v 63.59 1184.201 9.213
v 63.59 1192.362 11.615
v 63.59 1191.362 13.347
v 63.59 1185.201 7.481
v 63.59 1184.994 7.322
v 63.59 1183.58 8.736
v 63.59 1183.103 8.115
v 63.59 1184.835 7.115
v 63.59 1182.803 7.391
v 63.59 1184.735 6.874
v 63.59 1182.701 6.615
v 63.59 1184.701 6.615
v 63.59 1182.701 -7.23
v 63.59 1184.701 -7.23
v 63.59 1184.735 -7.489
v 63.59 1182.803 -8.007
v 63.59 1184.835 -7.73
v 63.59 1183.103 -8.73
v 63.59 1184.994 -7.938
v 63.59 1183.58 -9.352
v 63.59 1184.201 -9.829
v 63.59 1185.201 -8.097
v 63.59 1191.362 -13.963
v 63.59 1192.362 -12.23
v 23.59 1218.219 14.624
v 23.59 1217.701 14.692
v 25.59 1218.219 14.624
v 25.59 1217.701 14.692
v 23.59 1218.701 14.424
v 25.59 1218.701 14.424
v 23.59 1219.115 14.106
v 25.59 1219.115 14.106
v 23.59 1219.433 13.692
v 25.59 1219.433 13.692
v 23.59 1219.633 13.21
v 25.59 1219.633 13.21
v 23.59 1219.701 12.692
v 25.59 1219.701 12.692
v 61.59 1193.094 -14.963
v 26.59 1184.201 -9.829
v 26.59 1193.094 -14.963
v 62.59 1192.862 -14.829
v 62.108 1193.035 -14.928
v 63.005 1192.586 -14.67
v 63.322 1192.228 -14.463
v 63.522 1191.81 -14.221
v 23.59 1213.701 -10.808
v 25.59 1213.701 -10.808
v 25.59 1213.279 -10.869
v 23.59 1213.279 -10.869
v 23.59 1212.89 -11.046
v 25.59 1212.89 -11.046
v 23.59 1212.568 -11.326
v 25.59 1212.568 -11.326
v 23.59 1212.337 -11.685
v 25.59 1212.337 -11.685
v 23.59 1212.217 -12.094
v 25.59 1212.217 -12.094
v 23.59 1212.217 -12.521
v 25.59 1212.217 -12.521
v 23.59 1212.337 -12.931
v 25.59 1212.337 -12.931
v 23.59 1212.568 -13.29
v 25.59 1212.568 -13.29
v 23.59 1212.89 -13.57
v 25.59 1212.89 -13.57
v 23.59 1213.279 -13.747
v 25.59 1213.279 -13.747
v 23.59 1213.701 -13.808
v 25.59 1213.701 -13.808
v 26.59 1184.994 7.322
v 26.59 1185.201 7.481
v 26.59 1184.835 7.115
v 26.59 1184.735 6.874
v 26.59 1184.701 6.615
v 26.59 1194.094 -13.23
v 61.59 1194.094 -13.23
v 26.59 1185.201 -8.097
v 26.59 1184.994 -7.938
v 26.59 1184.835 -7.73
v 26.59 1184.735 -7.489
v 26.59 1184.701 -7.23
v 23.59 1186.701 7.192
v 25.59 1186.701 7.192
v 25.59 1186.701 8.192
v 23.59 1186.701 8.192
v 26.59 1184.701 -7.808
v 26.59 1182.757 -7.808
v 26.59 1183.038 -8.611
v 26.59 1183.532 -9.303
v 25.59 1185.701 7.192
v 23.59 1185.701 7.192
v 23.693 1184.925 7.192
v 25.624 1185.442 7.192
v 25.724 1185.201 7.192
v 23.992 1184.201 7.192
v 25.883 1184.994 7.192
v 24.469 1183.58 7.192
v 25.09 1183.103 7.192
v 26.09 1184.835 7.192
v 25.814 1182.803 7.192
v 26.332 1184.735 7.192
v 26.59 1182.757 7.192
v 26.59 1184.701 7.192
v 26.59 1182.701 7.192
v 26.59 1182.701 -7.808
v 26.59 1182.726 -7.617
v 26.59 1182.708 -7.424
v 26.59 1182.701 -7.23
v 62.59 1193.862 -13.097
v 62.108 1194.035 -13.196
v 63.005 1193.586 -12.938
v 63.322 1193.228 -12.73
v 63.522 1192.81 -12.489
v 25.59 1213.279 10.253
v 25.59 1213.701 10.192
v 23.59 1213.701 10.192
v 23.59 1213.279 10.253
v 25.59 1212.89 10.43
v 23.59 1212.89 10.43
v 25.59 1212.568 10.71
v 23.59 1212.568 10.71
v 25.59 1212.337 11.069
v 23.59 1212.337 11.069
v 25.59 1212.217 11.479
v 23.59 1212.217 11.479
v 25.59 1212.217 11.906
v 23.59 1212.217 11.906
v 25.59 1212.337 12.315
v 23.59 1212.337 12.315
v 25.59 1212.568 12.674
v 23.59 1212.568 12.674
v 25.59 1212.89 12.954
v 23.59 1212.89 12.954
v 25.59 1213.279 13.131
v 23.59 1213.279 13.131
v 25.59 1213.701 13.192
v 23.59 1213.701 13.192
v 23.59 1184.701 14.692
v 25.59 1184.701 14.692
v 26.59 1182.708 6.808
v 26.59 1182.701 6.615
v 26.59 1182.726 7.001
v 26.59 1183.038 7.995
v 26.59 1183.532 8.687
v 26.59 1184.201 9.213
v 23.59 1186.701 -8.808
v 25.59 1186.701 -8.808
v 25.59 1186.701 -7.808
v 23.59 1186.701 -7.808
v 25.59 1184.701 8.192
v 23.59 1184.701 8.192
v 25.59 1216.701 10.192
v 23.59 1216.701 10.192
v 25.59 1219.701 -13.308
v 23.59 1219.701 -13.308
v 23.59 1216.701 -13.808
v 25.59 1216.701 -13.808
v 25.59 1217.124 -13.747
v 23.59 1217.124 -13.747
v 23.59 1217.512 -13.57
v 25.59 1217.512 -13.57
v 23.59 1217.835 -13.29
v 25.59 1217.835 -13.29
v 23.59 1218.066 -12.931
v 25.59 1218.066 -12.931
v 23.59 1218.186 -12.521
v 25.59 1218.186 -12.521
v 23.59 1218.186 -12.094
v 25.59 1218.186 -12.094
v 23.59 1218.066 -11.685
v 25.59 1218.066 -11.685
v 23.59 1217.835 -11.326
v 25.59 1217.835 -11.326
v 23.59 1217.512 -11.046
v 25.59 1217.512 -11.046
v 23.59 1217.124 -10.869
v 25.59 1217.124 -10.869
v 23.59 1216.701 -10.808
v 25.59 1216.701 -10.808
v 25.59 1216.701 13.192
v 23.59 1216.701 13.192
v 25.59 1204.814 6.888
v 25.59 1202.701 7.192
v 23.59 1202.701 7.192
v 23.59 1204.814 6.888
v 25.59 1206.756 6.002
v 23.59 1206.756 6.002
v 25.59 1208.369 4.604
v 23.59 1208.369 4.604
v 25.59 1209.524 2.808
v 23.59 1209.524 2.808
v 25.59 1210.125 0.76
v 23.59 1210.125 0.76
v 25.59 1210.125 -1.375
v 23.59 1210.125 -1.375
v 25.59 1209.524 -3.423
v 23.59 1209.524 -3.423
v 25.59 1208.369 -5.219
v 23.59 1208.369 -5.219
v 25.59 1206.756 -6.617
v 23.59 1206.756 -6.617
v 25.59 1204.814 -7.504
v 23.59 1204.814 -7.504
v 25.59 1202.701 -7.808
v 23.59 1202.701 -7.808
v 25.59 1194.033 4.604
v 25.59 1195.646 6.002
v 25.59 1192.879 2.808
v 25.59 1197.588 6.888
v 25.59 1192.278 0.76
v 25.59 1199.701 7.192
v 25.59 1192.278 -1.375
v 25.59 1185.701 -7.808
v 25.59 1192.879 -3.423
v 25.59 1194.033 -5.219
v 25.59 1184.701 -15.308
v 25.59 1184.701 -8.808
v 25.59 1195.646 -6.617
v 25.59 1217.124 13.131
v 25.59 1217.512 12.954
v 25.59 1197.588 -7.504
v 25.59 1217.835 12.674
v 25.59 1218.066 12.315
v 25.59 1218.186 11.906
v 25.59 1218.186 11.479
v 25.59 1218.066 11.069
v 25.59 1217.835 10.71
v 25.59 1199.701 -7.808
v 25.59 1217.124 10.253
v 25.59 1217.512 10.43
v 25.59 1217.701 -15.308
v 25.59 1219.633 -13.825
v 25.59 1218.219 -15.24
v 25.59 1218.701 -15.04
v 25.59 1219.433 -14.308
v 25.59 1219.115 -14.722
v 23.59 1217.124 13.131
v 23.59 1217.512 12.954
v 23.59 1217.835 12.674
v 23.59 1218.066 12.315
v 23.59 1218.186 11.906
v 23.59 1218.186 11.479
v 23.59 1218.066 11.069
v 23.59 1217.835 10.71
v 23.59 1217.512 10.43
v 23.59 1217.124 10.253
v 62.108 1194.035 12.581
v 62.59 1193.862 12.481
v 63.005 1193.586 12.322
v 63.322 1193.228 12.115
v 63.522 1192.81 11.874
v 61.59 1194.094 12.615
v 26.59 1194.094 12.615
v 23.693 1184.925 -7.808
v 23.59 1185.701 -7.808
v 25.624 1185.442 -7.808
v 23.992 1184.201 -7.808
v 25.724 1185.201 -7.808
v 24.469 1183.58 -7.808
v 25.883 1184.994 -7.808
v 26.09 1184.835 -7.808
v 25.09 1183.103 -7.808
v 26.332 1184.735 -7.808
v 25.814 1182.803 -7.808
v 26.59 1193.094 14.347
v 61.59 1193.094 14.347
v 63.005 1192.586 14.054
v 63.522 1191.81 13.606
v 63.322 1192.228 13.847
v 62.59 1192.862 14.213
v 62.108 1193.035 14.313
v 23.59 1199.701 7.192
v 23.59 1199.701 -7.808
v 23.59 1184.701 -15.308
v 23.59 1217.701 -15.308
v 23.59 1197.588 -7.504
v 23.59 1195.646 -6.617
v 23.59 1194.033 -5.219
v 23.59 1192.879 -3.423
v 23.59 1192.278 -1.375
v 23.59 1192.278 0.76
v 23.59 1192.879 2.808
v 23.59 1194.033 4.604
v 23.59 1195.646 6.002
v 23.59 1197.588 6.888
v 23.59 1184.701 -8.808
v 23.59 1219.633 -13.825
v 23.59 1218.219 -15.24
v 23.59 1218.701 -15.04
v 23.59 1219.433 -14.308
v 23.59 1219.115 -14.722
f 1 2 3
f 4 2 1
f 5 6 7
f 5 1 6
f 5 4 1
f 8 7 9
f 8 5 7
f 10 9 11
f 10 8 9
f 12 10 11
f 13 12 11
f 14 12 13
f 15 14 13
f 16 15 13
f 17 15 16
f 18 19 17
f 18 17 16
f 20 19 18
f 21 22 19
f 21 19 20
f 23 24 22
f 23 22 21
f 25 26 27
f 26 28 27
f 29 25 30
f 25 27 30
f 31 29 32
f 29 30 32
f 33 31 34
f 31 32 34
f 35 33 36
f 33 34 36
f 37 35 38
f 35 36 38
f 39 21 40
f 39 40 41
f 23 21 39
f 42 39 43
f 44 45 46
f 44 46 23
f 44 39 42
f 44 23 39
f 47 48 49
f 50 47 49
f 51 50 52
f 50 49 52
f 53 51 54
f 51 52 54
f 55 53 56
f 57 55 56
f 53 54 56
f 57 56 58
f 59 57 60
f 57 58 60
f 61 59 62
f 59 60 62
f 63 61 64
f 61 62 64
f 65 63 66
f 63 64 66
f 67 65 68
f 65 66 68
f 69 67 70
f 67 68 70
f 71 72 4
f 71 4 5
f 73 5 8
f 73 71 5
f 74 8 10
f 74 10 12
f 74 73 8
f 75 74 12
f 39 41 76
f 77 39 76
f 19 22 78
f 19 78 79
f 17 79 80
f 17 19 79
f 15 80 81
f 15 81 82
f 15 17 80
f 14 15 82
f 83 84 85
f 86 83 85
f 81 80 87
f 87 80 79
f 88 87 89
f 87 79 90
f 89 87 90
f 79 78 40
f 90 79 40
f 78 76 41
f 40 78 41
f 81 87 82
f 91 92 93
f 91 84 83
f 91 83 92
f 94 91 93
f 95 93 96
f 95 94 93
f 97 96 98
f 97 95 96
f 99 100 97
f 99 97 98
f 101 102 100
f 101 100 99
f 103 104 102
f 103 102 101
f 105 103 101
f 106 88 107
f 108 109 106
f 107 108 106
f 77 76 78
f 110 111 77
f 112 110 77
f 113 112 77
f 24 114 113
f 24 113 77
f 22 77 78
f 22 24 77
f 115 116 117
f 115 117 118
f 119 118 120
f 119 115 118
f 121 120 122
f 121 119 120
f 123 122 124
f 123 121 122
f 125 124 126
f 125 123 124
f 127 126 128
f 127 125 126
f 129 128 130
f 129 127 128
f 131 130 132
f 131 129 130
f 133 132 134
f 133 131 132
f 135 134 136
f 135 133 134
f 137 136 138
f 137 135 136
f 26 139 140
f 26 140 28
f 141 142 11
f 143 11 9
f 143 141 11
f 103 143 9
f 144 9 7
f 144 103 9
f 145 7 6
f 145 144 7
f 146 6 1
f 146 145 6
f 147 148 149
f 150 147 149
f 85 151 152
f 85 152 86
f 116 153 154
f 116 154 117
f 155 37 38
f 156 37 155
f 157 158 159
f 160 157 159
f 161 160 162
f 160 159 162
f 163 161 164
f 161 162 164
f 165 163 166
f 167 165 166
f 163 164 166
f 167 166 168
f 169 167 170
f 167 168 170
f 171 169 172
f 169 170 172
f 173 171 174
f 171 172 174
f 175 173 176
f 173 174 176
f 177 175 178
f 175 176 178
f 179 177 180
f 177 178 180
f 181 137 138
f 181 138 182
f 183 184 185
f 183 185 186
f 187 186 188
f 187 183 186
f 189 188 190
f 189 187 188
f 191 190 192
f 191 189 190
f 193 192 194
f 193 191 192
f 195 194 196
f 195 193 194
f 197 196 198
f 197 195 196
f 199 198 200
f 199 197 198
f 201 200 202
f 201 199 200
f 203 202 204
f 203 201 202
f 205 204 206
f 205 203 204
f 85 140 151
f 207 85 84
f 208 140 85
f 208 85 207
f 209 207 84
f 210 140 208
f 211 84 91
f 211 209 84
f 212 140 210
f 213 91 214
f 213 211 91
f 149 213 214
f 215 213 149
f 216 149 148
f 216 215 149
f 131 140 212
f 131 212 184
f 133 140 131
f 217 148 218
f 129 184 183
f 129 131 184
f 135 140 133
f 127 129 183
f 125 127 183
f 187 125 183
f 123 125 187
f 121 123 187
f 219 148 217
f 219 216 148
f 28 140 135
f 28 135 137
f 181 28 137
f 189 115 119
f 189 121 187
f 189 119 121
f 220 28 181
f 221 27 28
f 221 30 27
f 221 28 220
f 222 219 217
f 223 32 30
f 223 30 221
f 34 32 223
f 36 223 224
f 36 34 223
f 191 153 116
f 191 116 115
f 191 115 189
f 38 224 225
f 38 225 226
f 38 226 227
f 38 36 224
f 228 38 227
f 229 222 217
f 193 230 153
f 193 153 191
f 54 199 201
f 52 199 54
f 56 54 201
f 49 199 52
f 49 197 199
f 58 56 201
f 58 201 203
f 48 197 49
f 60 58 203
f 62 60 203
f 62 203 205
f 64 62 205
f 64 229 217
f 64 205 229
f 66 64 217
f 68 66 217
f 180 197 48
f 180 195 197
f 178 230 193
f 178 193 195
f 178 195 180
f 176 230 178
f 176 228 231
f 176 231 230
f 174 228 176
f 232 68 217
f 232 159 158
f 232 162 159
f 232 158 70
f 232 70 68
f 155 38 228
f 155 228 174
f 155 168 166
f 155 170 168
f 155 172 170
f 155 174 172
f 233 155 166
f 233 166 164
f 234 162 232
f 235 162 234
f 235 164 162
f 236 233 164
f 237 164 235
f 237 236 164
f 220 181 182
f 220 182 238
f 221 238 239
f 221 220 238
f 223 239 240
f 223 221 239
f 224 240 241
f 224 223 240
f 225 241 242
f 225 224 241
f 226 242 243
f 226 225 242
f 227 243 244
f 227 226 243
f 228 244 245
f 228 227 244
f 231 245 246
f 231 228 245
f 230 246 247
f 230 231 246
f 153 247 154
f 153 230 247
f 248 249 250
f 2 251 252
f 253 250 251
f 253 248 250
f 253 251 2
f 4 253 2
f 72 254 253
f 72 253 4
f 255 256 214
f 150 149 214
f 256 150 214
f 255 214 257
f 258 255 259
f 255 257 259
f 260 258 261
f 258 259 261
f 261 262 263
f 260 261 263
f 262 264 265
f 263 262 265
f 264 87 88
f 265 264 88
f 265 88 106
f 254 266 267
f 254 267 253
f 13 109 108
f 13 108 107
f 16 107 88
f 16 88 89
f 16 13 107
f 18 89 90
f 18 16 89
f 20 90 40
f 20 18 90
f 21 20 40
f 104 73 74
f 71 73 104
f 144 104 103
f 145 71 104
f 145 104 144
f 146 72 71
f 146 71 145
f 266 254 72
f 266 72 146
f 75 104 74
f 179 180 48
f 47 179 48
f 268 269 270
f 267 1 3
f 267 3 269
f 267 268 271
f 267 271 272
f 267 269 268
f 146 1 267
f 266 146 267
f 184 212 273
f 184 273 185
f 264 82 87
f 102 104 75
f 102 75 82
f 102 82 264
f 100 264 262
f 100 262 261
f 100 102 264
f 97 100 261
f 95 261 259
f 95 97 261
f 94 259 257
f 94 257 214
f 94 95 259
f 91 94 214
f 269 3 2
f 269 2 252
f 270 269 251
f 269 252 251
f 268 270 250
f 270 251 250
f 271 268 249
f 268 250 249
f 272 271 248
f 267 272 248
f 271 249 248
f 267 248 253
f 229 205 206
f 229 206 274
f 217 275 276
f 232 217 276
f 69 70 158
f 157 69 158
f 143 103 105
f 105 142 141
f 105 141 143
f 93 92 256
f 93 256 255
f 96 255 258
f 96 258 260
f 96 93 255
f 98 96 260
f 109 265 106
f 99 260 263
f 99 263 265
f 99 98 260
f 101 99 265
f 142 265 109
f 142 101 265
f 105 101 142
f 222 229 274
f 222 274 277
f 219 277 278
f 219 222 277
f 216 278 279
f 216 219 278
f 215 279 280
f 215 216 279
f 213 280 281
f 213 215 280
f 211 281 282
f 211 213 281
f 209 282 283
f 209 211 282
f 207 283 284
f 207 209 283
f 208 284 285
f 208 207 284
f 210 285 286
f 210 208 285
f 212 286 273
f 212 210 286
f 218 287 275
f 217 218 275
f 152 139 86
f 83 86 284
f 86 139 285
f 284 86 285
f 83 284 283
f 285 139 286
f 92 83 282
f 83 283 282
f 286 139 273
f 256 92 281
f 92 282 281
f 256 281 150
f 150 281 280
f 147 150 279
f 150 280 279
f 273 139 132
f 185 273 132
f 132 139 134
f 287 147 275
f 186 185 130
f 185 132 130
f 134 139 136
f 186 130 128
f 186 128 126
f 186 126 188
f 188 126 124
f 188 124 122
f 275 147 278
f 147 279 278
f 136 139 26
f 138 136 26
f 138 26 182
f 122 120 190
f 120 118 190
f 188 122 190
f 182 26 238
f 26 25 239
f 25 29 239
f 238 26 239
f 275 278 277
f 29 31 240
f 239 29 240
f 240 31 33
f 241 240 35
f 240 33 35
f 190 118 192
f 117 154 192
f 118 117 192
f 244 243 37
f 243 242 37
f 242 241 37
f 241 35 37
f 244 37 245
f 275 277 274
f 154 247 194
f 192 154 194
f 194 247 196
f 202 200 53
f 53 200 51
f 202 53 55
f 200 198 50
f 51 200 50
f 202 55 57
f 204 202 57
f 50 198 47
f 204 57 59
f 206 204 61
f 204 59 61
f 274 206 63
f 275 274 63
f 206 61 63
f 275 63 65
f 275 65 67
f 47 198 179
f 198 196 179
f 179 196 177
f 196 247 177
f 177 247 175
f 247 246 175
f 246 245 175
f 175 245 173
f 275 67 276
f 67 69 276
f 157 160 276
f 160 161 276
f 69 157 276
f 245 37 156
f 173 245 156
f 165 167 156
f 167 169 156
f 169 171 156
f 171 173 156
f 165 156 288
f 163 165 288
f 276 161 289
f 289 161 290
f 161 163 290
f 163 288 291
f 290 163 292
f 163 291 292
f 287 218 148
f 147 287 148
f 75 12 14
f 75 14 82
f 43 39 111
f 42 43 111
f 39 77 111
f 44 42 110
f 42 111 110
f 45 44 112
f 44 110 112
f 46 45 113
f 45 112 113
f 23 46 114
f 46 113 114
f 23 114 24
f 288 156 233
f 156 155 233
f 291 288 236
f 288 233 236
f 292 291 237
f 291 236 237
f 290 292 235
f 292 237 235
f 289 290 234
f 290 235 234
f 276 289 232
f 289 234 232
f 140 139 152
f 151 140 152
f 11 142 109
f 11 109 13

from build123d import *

# Parameters (mm, degrees)
SKETCH1_W                      = 30
SKETCH1_H                      = 35
BASE_FLANGE1_DEPTH             = 2
EDGE_FLANGE1_STRIP_W           = 10
EDGE_FLANGE1_STRIP_H           = 2
EDGE_FLANGE1_STRIP_CUT_DEPTH   = 15
EDGE_FLANGE1_RELIEF_W          = 11
EDGE_FLANGE1_RELIEF_H          = 1
EDGE_FLANGE1_RELIEF_CUT_DEPTH  = 2
EDGE_FLANGE1_DEPTH             = 15
CUT_EXTRUDE1_REACH             = 1222.389
CUT_EXTRUDE2_REACH             = 1222.389
EDGE_FLANGE3_STRIP_CUT_DEPTH   = 37
EDGE_FLANGE3_STRIP_CUT_2_DEPTH = 37
EDGE_FLANGE3_DEPTH             = 37
EDGE_FLANGE3_BEND_DEPTH        = 37
FILLET5_R                      = 2


# Sheet-metal steps are written as plain solids
with BuildPart() as part:
    # Sketch1 → Base-Flange1 (new body)
    with BuildSketch(Plane(origin=(23.590386714, 0, 0), x_dir=(0, 0, -1), z_dir=(1, 0, 0))):
        with Locations((0.307827961, 1202.201275355)):
            Rectangle(SKETCH1_W, SKETCH1_H)
    extrude(amount=BASE_FLANGE1_DEPTH)

    # Edge-Flange1 strip (across the edge) → Edge-Flange1 strip cut (cut)
    with BuildSketch(Plane(origin=(25.590386714, 1184.701275355, 7.192172039), x_dir=(0, 1, 0), z_dir=(0, 0, -1))):
        with Locations((-4, -1)):
            Rectangle(EDGE_FLANGE1_STRIP_W, EDGE_FLANGE1_STRIP_H)
    extrude(amount=EDGE_FLANGE1_STRIP_CUT_DEPTH, mode=Mode.SUBTRACT)

    # Edge-Flange1 relief (on the sheet) → Edge-Flange1 relief cut (cut)
    with BuildSketch(Plane(origin=(25.590386714, 1185.701275355, 7.192172039), x_dir=(0, 1, 0), z_dir=(1, 0, 0))):
        with Locations((-4.5, 0.5)):
            Rectangle(EDGE_FLANGE1_RELIEF_W, EDGE_FLANGE1_RELIEF_H)
        with Locations((-4.5, -15.5)):
            Rectangle(EDGE_FLANGE1_RELIEF_W, EDGE_FLANGE1_RELIEF_H)
    extrude(amount=-EDGE_FLANGE1_RELIEF_CUT_DEPTH, mode=Mode.SUBTRACT)

    # Edge-Flange1 section (across the edge) → Edge-Flange1 (add)
    with BuildSketch(Plane(origin=(25.590386714, 1184.701275355, 7.192172039), x_dir=(0, 1, 0), z_dir=(0, 0, -1))):
        with BuildLine():
            Line((-2, 1), (-2, 38))
            Line((-2, 38), (0, 38))
            Line((0, 38), (0, 1))
            ThreePointArc((0, 1), (0.292893219, 0.292893219), (1, 0))
            Line((1, 0), (1, -2))
            ThreePointArc((1, -2), (-1.121320344, -1.121320344), (-2, 1))
        make_face()
    extrude(amount=EDGE_FLANGE1_DEPTH)

    # Sketch7 → Cut-Extrude1 (cut, up to next)
    with BuildSketch(Plane(origin=(25.590386714, 0, 0), x_dir=(0, 0, -1), z_dir=(1, 0, 0)), mode=Mode.PRIVATE) as cut_extrude1_sk1:
        with BuildLine():
            Line((-10.192172039, 1216.701275355), (-10.192172039, 1213.701275355))
            ThreePointArc((-10.192172039, 1213.701275355), (-11.692172039, 1212.201275355), (-13.192172039, 1213.701275355))
            Line((-13.192172039, 1213.701275355), (-13.192172039, 1216.701275355))
            ThreePointArc((-13.192172039, 1216.701275355), (-11.692172039, 1218.201275355), (-10.192172039, 1216.701275355))
        make_face()
    cut_extrude1_tool1 = extrude(cut_extrude1_sk1.sketch, amount=-CUT_EXTRUDE1_REACH, mode=Mode.PRIVATE) & part.part
    # Sketch7 → Cut-Extrude1 (cut, up to next)
    with BuildSketch(Plane(origin=(25.590386714, 0, 0), x_dir=(0, 0, -1), z_dir=(1, 0, 0)), mode=Mode.PRIVATE) as cut_extrude1_sk2:
        with BuildLine():
            Line((10.807827961, 1216.701275355), (10.807827961, 1213.701275355))
            ThreePointArc((10.807827961, 1213.701275355), (12.307827961, 1212.201275355), (13.807827961, 1213.701275355))
            Line((13.807827961, 1213.701275355), (13.807827961, 1216.701275355))
            ThreePointArc((13.807827961, 1216.701275355), (12.307827961, 1218.201275355), (10.807827961, 1216.701275355))
        make_face()
    cut_extrude1_tool2 = extrude(cut_extrude1_sk2.sketch, amount=-CUT_EXTRUDE1_REACH, mode=Mode.PRIVATE) & part.part
    add(cut_extrude1_tool1.solids().sort_by_distance((25.590387, 1215.201275, 11.692172))[0], mode=Mode.SUBTRACT)
    add(cut_extrude1_tool2.solids().sort_by_distance((25.590387, 1215.201275, -12.307828))[0], mode=Mode.SUBTRACT)

    # Sketch8 → Cut-Extrude2 (cut, up to next)
    with BuildSketch(Plane(origin=(25.590386714, 0, 0), x_dir=(0, 0, -1), z_dir=(1, 0, 0)), mode=Mode.PRIVATE) as cut_extrude2_sk1:
        with BuildLine():
            Line((-7.192172039, 1199.701275355), (-7.192172039, 1202.701275355))
            ThreePointArc((-7.192172039, 1202.701275355), (0.307827961, 1210.201275355), (7.807827961, 1202.701275355))
            Line((7.807827961, 1202.701275355), (7.807827961, 1199.701275355))
            ThreePointArc((7.807827961, 1199.701275355), (0.307827961, 1192.201275355), (-7.192172039, 1199.701275355))
        make_face()
    cut_extrude2_tool1 = extrude(cut_extrude2_sk1.sketch, amount=-CUT_EXTRUDE2_REACH, mode=Mode.PRIVATE) & part.part
    add(cut_extrude2_tool1.solids().sort_by_distance((25.590387, 1201.201275, -0.307828))[0], mode=Mode.SUBTRACT)

    # Edge-Flange3 strip (across the edge) → Edge-Flange3 strip cut (cut)
    with BuildSketch(Plane(origin=(26.590386714, 1184.701275355, 7.192172039), x_dir=(3.000602769257188e-15, 0.5000000000000041, -0.8660254037844364), z_dir=(1, 0, 0))):
        Polygon((-9.160254038, 2.979274058), (-0.5, -2.020725942), (0.5, -0.288675135), (-8.160254038, 4.711324865), align=None)
    extrude(amount=EDGE_FLANGE3_STRIP_CUT_DEPTH, mode=Mode.SUBTRACT)

    # Edge-Flange3 strip 2 (across the edge) → Edge-Flange3 strip cut 2 (cut)
    with BuildSketch(Plane(origin=(63.590386714, 1184.701275355, -7.807827961), x_dir=(2.9396981233624387e-15, 0.5000000000000041, 0.8660254037844364), z_dir=(-1, 0, 0))):
        Polygon((-9.160254038, 2.979274058), (-0.5, -2.020725942), (0.5, -0.288675135), (-8.160254038, 4.711324865), align=None)
    extrude(amount=EDGE_FLANGE3_STRIP_CUT_2_DEPTH, mode=Mode.SUBTRACT)

    # Edge-Flange3 section (across the edge) → Edge-Flange3 (add)
    with BuildSketch(Plane(origin=(26.590386714, 1184.701275355, 7.192172039), x_dir=(3.000602769257188e-15, 0.5000000000000041, -0.8660254037844364), z_dir=(1, 0, 0))):
        with BuildLine():
            Line((-2, 0.577350269), (-2, 10.845299462))
            Line((-2, 10.845299462), (0, 10.845299462))
            Line((0, 10.845299462), (0, 0.577350269))
            ThreePointArc((0, 0.577350269), (0.133974596, 0.077350269), (0.5, -0.288675135))
            Line((0.5, -0.288675135), (-0.5, -2.020725942))
            ThreePointArc((-0.5, -2.020725942), (-1.598076211, -0.922649731), (-2, 0.577350269))
        make_face()
    extrude(amount=EDGE_FLANGE3_DEPTH)

    # Edge-Flange3 section 2 (across the edge) → Edge-Flange3 bend (add)
    with BuildSketch(Plane(origin=(63.590386714, 1184.701275355, -7.807827961), x_dir=(2.9396981233624387e-15, 0.5000000000000041, 0.8660254037844364), z_dir=(-1, 0, 0))):
        with BuildLine():
            Line((-2, 0.577350269), (-2, 10.845299462))
            Line((-2, 10.845299462), (0, 10.845299462))
            Line((0, 10.845299462), (0, 0.577350269))
            ThreePointArc((0, 0.577350269), (0.133974596, 0.077350269), (0.5, -0.288675135))
            Line((0.5, -0.288675135), (-0.5, -2.020725942))
            ThreePointArc((-0.5, -2.020725942), (-1.598076211, -0.922649731), (-2, 0.577350269))
        make_face()
    extrude(amount=EDGE_FLANGE3_BEND_DEPTH)

    # Fillet5
    fillet5_edges = [part.edges().sort_by_distance(p)[0] for p in [
        (63.590386714, 1193.5935802, 13.480847173),
        (63.590386714, 1193.5935802, -14.096503096),
        (24.590386714, 1219.701275355, 14.692172039),
        (24.590386714, 1219.701275355, -15.307827961),
    ]]
    fillet(fillet5_edges, radius=FILLET5_R)


solid = part.part
